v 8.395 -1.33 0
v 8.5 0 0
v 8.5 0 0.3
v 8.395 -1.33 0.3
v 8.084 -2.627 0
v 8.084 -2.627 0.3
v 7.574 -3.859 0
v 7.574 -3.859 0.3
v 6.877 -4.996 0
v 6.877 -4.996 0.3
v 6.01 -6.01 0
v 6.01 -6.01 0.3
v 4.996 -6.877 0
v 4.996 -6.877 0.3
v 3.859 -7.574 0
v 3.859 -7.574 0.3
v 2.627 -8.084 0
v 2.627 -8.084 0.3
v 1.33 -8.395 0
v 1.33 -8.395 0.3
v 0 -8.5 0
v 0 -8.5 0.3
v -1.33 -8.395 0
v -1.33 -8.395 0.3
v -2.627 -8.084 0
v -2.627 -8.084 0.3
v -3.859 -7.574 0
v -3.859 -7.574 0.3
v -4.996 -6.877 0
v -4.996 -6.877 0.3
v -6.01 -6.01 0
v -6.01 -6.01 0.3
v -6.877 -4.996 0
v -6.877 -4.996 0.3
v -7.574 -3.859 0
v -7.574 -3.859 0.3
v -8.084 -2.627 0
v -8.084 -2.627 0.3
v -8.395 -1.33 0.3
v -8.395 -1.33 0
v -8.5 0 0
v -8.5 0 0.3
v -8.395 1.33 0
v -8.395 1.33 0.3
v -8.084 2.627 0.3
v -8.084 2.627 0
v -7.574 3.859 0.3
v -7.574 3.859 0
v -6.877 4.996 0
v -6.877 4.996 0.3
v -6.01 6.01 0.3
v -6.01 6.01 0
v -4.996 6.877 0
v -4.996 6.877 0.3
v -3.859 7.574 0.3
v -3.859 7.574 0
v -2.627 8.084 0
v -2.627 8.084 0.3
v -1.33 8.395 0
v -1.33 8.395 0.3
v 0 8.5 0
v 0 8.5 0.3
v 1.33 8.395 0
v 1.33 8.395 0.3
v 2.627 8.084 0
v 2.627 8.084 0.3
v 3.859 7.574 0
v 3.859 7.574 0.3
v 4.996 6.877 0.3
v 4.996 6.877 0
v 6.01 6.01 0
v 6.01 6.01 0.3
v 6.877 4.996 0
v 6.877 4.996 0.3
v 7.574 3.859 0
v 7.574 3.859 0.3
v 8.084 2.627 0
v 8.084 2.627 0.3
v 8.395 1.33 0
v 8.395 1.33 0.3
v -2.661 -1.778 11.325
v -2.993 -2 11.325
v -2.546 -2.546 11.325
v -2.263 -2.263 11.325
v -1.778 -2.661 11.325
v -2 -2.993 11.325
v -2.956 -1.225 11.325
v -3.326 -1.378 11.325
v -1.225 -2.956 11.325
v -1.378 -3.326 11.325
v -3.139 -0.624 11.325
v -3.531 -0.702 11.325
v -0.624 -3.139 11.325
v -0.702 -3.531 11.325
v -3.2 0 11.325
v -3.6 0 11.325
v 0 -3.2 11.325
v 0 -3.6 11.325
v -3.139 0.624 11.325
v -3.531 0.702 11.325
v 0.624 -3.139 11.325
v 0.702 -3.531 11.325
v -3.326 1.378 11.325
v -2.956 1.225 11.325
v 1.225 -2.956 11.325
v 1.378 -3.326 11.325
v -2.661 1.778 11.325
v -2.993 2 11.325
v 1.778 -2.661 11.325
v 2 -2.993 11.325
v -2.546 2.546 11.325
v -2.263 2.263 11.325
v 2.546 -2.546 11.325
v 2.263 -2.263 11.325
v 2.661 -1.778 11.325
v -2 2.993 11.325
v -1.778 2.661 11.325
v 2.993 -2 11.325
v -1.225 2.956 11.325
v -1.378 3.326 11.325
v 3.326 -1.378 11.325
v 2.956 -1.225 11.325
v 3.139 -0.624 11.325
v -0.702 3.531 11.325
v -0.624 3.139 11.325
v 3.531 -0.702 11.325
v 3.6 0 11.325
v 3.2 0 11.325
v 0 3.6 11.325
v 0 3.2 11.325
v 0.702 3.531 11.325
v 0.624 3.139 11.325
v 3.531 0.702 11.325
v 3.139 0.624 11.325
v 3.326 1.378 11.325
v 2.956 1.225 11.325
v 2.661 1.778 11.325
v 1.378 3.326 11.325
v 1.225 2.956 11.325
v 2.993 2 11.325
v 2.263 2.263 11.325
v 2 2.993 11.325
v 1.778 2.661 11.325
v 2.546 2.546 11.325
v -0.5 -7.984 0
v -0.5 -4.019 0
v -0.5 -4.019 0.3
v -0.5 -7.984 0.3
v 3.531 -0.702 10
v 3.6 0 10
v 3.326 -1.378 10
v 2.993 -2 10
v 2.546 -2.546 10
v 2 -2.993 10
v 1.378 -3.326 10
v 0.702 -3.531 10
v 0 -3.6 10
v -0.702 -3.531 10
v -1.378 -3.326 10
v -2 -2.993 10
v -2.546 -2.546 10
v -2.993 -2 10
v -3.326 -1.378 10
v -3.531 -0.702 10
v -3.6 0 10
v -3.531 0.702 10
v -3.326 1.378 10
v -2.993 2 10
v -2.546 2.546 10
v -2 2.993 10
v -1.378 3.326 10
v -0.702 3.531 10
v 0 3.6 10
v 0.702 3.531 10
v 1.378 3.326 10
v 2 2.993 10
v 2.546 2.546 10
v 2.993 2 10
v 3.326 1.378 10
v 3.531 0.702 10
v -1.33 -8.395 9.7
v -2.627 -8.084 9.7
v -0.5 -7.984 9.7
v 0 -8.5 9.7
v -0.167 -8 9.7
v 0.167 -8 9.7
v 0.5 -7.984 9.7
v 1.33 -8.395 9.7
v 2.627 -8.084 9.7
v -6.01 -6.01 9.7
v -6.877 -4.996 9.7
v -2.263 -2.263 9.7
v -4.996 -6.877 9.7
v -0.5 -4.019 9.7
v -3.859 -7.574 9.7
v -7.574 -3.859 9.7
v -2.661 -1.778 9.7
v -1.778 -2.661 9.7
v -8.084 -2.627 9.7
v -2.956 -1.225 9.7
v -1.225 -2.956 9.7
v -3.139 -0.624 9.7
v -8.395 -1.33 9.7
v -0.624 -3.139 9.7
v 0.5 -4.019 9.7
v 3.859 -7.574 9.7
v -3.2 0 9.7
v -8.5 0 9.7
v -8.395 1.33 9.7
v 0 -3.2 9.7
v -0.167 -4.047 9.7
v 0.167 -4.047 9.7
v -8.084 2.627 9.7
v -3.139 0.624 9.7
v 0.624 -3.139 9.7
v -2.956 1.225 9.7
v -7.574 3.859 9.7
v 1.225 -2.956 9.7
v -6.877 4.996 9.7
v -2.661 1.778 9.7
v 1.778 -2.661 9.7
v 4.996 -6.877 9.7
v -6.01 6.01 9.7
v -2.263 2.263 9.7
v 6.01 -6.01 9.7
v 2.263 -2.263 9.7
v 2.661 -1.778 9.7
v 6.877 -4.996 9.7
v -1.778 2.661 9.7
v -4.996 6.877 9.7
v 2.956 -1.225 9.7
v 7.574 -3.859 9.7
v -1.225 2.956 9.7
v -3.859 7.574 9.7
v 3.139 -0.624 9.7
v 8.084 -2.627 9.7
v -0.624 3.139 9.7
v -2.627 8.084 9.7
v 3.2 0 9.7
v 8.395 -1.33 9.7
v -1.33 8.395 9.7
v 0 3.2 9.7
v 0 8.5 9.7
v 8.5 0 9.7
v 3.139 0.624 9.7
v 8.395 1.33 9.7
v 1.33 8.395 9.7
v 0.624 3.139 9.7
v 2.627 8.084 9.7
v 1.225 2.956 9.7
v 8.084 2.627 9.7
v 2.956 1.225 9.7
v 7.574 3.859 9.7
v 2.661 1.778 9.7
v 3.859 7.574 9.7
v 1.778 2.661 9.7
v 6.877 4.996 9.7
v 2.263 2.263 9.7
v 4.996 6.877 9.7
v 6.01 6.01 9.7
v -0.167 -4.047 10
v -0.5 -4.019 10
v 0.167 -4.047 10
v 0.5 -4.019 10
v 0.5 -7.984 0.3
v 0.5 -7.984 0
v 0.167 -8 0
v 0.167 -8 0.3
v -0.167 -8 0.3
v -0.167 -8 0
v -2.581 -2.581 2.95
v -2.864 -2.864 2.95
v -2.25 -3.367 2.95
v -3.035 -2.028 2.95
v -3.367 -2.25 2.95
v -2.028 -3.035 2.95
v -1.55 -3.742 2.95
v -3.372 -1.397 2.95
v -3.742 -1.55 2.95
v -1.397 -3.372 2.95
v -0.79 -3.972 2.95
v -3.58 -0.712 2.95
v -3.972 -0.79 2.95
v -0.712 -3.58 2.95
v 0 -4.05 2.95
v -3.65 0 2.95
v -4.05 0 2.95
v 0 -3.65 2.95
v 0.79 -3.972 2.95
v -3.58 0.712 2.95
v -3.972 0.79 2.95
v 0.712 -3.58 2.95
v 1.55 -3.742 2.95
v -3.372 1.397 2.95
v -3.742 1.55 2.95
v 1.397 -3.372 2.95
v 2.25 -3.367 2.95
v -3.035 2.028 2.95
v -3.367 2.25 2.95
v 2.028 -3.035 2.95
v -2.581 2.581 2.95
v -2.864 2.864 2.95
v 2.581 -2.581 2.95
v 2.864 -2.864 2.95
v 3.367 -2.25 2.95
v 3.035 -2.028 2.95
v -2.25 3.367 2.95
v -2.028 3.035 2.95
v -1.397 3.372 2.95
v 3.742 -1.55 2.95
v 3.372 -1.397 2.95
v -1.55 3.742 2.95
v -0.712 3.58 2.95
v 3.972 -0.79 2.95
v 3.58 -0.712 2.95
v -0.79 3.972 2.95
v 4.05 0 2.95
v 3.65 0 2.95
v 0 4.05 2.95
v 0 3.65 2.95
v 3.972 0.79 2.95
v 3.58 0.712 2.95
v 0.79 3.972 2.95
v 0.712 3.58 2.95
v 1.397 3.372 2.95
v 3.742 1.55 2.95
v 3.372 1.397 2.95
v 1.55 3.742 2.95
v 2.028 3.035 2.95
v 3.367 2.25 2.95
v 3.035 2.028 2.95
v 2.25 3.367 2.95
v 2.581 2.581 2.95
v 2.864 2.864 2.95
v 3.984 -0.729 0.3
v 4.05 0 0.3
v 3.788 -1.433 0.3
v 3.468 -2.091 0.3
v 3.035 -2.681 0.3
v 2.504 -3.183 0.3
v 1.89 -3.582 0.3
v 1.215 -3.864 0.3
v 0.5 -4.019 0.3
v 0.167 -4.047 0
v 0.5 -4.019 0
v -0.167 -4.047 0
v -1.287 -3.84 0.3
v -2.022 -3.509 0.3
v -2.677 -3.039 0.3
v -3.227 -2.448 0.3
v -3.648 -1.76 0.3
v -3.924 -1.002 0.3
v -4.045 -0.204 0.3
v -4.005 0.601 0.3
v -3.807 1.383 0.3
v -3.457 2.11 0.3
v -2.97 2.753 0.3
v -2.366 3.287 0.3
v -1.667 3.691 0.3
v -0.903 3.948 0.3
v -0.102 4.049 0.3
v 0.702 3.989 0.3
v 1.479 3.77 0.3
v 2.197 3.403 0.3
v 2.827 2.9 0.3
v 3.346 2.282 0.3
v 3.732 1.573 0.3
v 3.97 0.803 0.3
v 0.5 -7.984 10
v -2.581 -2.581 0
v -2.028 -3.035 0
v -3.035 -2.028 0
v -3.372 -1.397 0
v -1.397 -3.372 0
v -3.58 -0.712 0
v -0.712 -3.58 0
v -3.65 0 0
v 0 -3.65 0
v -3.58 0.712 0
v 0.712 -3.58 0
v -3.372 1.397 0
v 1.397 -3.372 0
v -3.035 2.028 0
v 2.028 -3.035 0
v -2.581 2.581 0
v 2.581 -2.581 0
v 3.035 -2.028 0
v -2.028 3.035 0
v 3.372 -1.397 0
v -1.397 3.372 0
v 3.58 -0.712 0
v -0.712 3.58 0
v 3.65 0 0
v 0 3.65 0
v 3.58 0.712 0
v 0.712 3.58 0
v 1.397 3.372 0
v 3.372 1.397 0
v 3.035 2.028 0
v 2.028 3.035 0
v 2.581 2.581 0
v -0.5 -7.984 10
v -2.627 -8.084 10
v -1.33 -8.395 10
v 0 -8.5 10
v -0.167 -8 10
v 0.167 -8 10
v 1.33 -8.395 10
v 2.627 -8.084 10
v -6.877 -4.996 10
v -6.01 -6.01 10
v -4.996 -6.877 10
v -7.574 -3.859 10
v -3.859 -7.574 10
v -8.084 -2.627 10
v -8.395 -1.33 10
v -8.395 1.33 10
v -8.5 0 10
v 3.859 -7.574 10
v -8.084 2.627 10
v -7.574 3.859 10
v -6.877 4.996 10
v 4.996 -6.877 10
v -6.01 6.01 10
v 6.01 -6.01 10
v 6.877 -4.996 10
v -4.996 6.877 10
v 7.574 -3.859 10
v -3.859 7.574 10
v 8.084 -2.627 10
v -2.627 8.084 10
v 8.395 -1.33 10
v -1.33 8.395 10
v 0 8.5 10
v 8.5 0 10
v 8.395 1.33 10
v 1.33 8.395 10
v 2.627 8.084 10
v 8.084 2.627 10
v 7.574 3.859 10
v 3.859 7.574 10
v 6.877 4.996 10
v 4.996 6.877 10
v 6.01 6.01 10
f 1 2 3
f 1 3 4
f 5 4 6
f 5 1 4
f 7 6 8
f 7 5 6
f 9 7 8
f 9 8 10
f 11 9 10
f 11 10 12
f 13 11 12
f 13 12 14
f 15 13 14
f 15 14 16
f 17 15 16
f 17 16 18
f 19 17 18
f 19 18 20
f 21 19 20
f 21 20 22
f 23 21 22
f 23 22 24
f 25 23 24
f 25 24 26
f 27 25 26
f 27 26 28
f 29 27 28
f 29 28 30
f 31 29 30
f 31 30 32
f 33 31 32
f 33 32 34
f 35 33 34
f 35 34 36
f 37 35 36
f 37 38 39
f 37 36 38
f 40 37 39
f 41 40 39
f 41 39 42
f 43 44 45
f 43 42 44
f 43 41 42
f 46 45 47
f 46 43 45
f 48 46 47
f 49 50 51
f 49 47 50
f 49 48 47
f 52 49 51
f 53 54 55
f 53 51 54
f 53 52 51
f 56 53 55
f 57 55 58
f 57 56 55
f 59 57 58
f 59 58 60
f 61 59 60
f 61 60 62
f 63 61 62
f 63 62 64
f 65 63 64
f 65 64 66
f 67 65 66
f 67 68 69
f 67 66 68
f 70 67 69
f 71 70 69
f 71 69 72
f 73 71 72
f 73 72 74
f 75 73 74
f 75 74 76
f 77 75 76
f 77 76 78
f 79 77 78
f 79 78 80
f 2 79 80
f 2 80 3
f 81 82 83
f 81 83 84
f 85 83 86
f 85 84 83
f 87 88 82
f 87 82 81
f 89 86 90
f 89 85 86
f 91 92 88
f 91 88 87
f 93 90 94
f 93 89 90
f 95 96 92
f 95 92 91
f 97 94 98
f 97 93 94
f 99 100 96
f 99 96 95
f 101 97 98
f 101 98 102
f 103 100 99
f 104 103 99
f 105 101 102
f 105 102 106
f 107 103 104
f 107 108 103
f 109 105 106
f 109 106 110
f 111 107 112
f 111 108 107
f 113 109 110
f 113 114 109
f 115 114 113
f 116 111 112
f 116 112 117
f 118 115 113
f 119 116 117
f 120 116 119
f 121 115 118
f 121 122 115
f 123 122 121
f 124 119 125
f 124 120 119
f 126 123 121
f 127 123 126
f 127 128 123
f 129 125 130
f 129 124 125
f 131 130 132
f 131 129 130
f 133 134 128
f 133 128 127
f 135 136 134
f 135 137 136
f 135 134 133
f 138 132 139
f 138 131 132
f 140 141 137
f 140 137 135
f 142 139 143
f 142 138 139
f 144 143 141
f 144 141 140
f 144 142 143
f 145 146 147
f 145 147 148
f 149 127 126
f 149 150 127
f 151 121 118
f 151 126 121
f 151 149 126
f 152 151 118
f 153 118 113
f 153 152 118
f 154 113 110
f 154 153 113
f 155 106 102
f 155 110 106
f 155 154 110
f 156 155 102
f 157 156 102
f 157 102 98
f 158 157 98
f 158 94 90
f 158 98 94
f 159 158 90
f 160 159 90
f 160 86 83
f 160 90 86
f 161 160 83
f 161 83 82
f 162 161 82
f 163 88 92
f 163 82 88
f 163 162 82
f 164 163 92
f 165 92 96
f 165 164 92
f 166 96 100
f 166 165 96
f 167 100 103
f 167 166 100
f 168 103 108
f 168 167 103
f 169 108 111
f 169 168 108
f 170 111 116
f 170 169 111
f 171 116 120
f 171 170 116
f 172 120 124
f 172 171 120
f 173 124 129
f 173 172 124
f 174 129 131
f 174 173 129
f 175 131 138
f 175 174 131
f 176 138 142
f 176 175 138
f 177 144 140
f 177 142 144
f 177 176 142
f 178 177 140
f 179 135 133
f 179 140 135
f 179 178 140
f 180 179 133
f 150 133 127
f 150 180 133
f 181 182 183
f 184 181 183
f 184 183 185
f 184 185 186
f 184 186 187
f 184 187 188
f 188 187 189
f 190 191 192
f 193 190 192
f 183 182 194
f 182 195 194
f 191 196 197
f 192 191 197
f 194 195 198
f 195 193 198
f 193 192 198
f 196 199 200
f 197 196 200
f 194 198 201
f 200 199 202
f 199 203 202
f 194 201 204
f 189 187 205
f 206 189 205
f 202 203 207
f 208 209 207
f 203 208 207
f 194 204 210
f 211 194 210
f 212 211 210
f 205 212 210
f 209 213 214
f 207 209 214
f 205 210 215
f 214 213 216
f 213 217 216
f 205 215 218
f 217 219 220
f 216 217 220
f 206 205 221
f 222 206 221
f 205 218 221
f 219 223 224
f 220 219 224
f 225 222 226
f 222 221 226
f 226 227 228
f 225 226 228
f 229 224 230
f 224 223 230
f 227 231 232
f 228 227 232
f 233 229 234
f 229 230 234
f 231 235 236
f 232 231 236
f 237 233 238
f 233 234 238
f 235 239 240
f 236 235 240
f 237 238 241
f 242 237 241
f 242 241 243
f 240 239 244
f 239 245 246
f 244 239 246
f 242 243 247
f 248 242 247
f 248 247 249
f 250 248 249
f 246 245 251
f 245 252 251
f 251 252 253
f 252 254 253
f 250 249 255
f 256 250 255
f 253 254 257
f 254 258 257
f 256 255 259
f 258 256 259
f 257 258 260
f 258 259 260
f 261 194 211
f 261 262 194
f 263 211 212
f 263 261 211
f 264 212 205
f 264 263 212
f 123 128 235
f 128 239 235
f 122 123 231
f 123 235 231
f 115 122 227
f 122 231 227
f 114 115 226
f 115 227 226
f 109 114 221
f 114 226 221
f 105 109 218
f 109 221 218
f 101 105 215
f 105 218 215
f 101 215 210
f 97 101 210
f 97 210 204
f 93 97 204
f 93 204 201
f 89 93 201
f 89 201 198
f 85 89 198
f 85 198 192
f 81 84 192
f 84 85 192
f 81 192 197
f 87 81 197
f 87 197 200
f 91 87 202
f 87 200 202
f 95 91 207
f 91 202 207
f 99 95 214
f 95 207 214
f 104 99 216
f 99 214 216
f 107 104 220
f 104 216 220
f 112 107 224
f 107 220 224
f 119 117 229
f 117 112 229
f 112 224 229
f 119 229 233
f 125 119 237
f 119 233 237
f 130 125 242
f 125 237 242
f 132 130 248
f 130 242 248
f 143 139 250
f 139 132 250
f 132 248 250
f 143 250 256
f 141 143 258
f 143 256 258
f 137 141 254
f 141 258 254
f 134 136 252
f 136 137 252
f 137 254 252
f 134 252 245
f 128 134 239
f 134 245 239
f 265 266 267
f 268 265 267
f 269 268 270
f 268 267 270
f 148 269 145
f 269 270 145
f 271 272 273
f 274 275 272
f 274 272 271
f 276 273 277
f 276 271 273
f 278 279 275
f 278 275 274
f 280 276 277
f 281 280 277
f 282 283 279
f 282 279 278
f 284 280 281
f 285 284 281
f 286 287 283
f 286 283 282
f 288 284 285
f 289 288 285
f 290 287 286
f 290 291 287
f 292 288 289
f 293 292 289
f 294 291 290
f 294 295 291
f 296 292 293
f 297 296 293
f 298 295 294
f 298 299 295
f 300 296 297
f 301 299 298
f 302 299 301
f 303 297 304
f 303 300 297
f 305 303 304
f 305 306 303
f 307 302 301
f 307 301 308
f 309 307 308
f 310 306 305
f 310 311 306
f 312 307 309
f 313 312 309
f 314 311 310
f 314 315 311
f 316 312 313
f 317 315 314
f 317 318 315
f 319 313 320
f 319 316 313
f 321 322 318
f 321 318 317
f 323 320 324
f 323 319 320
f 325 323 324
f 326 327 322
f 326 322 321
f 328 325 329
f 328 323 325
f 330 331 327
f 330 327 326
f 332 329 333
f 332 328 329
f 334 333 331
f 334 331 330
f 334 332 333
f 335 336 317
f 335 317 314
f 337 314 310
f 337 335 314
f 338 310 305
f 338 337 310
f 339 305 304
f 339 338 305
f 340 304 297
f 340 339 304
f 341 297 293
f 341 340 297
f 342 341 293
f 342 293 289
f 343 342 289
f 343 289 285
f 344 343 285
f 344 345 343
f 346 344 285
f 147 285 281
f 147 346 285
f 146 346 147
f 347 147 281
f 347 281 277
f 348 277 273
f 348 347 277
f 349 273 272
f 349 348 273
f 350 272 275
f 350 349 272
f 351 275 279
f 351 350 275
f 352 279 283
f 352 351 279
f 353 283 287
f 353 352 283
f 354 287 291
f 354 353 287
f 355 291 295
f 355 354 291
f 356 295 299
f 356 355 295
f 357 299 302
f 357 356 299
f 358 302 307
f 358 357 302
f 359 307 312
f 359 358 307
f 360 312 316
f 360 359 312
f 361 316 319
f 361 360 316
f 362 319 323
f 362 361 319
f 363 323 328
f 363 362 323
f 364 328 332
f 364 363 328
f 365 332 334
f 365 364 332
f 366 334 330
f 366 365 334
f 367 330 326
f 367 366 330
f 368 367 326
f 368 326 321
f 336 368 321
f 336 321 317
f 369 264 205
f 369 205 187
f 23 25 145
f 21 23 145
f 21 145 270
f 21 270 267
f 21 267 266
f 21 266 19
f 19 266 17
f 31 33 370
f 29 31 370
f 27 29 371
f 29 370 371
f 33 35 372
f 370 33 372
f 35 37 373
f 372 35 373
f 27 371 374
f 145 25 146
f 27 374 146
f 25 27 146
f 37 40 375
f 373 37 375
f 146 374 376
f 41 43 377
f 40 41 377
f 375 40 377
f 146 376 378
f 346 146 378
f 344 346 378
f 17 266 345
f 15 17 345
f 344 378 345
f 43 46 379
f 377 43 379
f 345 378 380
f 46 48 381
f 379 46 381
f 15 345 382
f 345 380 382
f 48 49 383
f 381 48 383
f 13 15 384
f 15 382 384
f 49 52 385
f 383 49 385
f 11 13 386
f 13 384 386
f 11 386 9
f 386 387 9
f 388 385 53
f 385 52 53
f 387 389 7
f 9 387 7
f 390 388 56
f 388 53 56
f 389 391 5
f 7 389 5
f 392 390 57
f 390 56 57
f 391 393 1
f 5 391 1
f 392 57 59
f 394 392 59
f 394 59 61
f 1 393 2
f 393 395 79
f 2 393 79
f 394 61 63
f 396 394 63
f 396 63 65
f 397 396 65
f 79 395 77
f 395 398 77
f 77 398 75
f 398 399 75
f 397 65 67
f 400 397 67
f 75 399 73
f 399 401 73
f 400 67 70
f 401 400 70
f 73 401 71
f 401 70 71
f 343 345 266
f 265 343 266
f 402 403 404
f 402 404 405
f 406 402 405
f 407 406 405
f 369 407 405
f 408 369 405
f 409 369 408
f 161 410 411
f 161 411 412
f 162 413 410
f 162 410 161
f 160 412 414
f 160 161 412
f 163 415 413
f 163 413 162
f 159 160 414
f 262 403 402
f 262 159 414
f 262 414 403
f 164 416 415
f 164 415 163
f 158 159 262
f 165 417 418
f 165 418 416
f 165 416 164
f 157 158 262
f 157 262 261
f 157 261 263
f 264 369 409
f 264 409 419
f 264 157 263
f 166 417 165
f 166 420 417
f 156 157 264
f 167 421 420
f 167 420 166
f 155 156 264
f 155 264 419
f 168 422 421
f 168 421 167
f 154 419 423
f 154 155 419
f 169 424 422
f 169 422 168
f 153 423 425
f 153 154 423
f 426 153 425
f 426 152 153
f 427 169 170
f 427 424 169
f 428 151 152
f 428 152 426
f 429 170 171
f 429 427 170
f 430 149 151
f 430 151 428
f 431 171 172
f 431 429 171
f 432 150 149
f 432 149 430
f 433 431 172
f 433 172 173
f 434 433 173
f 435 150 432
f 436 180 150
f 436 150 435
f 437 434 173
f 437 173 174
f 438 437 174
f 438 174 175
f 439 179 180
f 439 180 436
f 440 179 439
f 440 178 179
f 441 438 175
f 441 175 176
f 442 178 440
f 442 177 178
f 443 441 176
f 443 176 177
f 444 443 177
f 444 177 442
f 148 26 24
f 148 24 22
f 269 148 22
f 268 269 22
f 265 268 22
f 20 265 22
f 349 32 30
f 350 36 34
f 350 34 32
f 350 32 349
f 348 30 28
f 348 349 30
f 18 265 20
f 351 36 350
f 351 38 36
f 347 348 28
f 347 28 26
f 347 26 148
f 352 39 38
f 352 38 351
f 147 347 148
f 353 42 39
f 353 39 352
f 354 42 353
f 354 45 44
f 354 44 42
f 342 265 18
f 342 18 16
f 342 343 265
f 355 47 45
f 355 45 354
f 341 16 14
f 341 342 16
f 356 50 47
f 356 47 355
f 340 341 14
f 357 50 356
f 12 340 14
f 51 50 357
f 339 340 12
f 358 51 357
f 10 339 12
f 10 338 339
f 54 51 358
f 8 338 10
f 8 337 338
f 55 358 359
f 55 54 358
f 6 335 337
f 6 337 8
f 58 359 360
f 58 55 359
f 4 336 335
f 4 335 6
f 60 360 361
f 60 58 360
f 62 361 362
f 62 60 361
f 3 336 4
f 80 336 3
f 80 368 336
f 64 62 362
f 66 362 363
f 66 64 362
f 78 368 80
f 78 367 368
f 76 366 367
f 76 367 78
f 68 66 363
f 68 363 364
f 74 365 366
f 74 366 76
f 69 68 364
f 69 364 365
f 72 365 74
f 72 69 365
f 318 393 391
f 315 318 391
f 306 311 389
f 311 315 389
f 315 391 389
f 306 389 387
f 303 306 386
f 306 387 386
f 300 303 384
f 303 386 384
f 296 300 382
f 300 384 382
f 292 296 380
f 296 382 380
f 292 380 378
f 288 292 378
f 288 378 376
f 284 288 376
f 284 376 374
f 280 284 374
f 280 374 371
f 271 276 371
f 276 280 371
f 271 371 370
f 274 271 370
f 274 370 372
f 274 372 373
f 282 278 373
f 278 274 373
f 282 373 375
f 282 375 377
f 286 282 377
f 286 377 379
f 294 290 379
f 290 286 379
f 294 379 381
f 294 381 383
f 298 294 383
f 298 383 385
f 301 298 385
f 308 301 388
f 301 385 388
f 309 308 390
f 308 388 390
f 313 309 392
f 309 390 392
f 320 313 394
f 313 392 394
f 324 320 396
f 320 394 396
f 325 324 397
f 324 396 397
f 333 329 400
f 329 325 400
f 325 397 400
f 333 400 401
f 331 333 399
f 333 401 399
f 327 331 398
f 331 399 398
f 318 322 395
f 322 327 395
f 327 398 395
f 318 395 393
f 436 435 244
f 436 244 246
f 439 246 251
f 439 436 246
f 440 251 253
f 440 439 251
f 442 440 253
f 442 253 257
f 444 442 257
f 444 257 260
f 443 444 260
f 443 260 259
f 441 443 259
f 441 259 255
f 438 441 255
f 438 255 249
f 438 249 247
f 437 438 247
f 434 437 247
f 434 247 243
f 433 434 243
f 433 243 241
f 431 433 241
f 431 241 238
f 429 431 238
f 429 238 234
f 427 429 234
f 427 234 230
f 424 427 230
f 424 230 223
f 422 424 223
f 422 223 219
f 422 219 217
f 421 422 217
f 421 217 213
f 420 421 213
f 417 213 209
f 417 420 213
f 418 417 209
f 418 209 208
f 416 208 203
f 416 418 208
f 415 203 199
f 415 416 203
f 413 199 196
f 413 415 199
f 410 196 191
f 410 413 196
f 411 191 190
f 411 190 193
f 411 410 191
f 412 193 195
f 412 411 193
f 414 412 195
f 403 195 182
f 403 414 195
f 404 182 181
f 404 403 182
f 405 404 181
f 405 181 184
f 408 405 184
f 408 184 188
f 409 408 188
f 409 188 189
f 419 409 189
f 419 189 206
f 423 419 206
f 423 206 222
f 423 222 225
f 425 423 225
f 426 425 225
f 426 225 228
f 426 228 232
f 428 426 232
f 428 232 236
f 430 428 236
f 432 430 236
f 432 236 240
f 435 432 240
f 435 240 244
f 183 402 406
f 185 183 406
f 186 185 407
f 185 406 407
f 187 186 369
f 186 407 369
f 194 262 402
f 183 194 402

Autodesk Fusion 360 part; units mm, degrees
sketch "SingleSpool" plane through (0, 0, 0) normal (0, 0, 1) x (1, 0, 0)
  circle A0 centre (0, 0) radius 3.2
  circle A1 centre (0, 0) radius 3.6
  circle A2 centre (0, 0) radius 3.65
  circle A3 centre (0, 0) radius 4.05
  circle A4 centre (0, 0) radius 8.5
  circle A5 centre (0, 0) radius 8 construction
  line L0 (0, 0) -> (0, -8.0022) construction
  line L1 (-0.5, -0.0067) -> (-0.5, -7.9844) construction
  line L2 (0.5, 0.0066) -> (0.5, -7.9844) construction
  line L3 (-0.5, -4.019) -> (-0.5, -7.9844)
  line L4 (0.5, -4.019) -> (0.5, -7.9844)
  arc A6 (-0.5, -7.9844) -> (0.5, -7.9844) centre (0, -1.0022) ccw
  point P0 (0.5, 0.0066)
  point P1 (-0.5, -0.0067)
  dimension "d158" = 0.4
  dimension "d159" = 6.4
  dimension "d174" = 0.45
  dimension "d175" = 0.85
  dimension "d185" = 17
  dimension "d187" = 16
  dimension "d188" = 0.5
  dimension "d189" = 0.5
extrude "Extrude29" add sketch "SingleSpool" along normal blind 0.3 contours A3 | A4 makes body 1
extrude "Extrude30" add sketch "SingleSpool" along normal blind 2.65 from surface at 0.3 contours A3 bodies 1
extrude "Extrude32" add sketch "SingleSpool" along normal blind 1.325 from surface at 10 separate body contours A1 makes body 2
extrude "Extrude31" add sketch "SingleSpool" against normal blind 0.3 from surface at 10 contours A1 | A2 | A3 | A4 bodies 2
equation "coilWidth = 2.65 mm"
equation "pusherDiameter = 6 mm"
equation "spacerWidth = 0.3 mm"
equation "d159 = pusherDiameter + 0.4 mm"
equation "d164 = spacerWidth"
equation "d167 = coilWidth"
equation "d177 = -spacerWidth"
equation "d180 = coilWidth / 2"
equation "d187 = d185 - 1 mm"
equation "d189 = d188"
